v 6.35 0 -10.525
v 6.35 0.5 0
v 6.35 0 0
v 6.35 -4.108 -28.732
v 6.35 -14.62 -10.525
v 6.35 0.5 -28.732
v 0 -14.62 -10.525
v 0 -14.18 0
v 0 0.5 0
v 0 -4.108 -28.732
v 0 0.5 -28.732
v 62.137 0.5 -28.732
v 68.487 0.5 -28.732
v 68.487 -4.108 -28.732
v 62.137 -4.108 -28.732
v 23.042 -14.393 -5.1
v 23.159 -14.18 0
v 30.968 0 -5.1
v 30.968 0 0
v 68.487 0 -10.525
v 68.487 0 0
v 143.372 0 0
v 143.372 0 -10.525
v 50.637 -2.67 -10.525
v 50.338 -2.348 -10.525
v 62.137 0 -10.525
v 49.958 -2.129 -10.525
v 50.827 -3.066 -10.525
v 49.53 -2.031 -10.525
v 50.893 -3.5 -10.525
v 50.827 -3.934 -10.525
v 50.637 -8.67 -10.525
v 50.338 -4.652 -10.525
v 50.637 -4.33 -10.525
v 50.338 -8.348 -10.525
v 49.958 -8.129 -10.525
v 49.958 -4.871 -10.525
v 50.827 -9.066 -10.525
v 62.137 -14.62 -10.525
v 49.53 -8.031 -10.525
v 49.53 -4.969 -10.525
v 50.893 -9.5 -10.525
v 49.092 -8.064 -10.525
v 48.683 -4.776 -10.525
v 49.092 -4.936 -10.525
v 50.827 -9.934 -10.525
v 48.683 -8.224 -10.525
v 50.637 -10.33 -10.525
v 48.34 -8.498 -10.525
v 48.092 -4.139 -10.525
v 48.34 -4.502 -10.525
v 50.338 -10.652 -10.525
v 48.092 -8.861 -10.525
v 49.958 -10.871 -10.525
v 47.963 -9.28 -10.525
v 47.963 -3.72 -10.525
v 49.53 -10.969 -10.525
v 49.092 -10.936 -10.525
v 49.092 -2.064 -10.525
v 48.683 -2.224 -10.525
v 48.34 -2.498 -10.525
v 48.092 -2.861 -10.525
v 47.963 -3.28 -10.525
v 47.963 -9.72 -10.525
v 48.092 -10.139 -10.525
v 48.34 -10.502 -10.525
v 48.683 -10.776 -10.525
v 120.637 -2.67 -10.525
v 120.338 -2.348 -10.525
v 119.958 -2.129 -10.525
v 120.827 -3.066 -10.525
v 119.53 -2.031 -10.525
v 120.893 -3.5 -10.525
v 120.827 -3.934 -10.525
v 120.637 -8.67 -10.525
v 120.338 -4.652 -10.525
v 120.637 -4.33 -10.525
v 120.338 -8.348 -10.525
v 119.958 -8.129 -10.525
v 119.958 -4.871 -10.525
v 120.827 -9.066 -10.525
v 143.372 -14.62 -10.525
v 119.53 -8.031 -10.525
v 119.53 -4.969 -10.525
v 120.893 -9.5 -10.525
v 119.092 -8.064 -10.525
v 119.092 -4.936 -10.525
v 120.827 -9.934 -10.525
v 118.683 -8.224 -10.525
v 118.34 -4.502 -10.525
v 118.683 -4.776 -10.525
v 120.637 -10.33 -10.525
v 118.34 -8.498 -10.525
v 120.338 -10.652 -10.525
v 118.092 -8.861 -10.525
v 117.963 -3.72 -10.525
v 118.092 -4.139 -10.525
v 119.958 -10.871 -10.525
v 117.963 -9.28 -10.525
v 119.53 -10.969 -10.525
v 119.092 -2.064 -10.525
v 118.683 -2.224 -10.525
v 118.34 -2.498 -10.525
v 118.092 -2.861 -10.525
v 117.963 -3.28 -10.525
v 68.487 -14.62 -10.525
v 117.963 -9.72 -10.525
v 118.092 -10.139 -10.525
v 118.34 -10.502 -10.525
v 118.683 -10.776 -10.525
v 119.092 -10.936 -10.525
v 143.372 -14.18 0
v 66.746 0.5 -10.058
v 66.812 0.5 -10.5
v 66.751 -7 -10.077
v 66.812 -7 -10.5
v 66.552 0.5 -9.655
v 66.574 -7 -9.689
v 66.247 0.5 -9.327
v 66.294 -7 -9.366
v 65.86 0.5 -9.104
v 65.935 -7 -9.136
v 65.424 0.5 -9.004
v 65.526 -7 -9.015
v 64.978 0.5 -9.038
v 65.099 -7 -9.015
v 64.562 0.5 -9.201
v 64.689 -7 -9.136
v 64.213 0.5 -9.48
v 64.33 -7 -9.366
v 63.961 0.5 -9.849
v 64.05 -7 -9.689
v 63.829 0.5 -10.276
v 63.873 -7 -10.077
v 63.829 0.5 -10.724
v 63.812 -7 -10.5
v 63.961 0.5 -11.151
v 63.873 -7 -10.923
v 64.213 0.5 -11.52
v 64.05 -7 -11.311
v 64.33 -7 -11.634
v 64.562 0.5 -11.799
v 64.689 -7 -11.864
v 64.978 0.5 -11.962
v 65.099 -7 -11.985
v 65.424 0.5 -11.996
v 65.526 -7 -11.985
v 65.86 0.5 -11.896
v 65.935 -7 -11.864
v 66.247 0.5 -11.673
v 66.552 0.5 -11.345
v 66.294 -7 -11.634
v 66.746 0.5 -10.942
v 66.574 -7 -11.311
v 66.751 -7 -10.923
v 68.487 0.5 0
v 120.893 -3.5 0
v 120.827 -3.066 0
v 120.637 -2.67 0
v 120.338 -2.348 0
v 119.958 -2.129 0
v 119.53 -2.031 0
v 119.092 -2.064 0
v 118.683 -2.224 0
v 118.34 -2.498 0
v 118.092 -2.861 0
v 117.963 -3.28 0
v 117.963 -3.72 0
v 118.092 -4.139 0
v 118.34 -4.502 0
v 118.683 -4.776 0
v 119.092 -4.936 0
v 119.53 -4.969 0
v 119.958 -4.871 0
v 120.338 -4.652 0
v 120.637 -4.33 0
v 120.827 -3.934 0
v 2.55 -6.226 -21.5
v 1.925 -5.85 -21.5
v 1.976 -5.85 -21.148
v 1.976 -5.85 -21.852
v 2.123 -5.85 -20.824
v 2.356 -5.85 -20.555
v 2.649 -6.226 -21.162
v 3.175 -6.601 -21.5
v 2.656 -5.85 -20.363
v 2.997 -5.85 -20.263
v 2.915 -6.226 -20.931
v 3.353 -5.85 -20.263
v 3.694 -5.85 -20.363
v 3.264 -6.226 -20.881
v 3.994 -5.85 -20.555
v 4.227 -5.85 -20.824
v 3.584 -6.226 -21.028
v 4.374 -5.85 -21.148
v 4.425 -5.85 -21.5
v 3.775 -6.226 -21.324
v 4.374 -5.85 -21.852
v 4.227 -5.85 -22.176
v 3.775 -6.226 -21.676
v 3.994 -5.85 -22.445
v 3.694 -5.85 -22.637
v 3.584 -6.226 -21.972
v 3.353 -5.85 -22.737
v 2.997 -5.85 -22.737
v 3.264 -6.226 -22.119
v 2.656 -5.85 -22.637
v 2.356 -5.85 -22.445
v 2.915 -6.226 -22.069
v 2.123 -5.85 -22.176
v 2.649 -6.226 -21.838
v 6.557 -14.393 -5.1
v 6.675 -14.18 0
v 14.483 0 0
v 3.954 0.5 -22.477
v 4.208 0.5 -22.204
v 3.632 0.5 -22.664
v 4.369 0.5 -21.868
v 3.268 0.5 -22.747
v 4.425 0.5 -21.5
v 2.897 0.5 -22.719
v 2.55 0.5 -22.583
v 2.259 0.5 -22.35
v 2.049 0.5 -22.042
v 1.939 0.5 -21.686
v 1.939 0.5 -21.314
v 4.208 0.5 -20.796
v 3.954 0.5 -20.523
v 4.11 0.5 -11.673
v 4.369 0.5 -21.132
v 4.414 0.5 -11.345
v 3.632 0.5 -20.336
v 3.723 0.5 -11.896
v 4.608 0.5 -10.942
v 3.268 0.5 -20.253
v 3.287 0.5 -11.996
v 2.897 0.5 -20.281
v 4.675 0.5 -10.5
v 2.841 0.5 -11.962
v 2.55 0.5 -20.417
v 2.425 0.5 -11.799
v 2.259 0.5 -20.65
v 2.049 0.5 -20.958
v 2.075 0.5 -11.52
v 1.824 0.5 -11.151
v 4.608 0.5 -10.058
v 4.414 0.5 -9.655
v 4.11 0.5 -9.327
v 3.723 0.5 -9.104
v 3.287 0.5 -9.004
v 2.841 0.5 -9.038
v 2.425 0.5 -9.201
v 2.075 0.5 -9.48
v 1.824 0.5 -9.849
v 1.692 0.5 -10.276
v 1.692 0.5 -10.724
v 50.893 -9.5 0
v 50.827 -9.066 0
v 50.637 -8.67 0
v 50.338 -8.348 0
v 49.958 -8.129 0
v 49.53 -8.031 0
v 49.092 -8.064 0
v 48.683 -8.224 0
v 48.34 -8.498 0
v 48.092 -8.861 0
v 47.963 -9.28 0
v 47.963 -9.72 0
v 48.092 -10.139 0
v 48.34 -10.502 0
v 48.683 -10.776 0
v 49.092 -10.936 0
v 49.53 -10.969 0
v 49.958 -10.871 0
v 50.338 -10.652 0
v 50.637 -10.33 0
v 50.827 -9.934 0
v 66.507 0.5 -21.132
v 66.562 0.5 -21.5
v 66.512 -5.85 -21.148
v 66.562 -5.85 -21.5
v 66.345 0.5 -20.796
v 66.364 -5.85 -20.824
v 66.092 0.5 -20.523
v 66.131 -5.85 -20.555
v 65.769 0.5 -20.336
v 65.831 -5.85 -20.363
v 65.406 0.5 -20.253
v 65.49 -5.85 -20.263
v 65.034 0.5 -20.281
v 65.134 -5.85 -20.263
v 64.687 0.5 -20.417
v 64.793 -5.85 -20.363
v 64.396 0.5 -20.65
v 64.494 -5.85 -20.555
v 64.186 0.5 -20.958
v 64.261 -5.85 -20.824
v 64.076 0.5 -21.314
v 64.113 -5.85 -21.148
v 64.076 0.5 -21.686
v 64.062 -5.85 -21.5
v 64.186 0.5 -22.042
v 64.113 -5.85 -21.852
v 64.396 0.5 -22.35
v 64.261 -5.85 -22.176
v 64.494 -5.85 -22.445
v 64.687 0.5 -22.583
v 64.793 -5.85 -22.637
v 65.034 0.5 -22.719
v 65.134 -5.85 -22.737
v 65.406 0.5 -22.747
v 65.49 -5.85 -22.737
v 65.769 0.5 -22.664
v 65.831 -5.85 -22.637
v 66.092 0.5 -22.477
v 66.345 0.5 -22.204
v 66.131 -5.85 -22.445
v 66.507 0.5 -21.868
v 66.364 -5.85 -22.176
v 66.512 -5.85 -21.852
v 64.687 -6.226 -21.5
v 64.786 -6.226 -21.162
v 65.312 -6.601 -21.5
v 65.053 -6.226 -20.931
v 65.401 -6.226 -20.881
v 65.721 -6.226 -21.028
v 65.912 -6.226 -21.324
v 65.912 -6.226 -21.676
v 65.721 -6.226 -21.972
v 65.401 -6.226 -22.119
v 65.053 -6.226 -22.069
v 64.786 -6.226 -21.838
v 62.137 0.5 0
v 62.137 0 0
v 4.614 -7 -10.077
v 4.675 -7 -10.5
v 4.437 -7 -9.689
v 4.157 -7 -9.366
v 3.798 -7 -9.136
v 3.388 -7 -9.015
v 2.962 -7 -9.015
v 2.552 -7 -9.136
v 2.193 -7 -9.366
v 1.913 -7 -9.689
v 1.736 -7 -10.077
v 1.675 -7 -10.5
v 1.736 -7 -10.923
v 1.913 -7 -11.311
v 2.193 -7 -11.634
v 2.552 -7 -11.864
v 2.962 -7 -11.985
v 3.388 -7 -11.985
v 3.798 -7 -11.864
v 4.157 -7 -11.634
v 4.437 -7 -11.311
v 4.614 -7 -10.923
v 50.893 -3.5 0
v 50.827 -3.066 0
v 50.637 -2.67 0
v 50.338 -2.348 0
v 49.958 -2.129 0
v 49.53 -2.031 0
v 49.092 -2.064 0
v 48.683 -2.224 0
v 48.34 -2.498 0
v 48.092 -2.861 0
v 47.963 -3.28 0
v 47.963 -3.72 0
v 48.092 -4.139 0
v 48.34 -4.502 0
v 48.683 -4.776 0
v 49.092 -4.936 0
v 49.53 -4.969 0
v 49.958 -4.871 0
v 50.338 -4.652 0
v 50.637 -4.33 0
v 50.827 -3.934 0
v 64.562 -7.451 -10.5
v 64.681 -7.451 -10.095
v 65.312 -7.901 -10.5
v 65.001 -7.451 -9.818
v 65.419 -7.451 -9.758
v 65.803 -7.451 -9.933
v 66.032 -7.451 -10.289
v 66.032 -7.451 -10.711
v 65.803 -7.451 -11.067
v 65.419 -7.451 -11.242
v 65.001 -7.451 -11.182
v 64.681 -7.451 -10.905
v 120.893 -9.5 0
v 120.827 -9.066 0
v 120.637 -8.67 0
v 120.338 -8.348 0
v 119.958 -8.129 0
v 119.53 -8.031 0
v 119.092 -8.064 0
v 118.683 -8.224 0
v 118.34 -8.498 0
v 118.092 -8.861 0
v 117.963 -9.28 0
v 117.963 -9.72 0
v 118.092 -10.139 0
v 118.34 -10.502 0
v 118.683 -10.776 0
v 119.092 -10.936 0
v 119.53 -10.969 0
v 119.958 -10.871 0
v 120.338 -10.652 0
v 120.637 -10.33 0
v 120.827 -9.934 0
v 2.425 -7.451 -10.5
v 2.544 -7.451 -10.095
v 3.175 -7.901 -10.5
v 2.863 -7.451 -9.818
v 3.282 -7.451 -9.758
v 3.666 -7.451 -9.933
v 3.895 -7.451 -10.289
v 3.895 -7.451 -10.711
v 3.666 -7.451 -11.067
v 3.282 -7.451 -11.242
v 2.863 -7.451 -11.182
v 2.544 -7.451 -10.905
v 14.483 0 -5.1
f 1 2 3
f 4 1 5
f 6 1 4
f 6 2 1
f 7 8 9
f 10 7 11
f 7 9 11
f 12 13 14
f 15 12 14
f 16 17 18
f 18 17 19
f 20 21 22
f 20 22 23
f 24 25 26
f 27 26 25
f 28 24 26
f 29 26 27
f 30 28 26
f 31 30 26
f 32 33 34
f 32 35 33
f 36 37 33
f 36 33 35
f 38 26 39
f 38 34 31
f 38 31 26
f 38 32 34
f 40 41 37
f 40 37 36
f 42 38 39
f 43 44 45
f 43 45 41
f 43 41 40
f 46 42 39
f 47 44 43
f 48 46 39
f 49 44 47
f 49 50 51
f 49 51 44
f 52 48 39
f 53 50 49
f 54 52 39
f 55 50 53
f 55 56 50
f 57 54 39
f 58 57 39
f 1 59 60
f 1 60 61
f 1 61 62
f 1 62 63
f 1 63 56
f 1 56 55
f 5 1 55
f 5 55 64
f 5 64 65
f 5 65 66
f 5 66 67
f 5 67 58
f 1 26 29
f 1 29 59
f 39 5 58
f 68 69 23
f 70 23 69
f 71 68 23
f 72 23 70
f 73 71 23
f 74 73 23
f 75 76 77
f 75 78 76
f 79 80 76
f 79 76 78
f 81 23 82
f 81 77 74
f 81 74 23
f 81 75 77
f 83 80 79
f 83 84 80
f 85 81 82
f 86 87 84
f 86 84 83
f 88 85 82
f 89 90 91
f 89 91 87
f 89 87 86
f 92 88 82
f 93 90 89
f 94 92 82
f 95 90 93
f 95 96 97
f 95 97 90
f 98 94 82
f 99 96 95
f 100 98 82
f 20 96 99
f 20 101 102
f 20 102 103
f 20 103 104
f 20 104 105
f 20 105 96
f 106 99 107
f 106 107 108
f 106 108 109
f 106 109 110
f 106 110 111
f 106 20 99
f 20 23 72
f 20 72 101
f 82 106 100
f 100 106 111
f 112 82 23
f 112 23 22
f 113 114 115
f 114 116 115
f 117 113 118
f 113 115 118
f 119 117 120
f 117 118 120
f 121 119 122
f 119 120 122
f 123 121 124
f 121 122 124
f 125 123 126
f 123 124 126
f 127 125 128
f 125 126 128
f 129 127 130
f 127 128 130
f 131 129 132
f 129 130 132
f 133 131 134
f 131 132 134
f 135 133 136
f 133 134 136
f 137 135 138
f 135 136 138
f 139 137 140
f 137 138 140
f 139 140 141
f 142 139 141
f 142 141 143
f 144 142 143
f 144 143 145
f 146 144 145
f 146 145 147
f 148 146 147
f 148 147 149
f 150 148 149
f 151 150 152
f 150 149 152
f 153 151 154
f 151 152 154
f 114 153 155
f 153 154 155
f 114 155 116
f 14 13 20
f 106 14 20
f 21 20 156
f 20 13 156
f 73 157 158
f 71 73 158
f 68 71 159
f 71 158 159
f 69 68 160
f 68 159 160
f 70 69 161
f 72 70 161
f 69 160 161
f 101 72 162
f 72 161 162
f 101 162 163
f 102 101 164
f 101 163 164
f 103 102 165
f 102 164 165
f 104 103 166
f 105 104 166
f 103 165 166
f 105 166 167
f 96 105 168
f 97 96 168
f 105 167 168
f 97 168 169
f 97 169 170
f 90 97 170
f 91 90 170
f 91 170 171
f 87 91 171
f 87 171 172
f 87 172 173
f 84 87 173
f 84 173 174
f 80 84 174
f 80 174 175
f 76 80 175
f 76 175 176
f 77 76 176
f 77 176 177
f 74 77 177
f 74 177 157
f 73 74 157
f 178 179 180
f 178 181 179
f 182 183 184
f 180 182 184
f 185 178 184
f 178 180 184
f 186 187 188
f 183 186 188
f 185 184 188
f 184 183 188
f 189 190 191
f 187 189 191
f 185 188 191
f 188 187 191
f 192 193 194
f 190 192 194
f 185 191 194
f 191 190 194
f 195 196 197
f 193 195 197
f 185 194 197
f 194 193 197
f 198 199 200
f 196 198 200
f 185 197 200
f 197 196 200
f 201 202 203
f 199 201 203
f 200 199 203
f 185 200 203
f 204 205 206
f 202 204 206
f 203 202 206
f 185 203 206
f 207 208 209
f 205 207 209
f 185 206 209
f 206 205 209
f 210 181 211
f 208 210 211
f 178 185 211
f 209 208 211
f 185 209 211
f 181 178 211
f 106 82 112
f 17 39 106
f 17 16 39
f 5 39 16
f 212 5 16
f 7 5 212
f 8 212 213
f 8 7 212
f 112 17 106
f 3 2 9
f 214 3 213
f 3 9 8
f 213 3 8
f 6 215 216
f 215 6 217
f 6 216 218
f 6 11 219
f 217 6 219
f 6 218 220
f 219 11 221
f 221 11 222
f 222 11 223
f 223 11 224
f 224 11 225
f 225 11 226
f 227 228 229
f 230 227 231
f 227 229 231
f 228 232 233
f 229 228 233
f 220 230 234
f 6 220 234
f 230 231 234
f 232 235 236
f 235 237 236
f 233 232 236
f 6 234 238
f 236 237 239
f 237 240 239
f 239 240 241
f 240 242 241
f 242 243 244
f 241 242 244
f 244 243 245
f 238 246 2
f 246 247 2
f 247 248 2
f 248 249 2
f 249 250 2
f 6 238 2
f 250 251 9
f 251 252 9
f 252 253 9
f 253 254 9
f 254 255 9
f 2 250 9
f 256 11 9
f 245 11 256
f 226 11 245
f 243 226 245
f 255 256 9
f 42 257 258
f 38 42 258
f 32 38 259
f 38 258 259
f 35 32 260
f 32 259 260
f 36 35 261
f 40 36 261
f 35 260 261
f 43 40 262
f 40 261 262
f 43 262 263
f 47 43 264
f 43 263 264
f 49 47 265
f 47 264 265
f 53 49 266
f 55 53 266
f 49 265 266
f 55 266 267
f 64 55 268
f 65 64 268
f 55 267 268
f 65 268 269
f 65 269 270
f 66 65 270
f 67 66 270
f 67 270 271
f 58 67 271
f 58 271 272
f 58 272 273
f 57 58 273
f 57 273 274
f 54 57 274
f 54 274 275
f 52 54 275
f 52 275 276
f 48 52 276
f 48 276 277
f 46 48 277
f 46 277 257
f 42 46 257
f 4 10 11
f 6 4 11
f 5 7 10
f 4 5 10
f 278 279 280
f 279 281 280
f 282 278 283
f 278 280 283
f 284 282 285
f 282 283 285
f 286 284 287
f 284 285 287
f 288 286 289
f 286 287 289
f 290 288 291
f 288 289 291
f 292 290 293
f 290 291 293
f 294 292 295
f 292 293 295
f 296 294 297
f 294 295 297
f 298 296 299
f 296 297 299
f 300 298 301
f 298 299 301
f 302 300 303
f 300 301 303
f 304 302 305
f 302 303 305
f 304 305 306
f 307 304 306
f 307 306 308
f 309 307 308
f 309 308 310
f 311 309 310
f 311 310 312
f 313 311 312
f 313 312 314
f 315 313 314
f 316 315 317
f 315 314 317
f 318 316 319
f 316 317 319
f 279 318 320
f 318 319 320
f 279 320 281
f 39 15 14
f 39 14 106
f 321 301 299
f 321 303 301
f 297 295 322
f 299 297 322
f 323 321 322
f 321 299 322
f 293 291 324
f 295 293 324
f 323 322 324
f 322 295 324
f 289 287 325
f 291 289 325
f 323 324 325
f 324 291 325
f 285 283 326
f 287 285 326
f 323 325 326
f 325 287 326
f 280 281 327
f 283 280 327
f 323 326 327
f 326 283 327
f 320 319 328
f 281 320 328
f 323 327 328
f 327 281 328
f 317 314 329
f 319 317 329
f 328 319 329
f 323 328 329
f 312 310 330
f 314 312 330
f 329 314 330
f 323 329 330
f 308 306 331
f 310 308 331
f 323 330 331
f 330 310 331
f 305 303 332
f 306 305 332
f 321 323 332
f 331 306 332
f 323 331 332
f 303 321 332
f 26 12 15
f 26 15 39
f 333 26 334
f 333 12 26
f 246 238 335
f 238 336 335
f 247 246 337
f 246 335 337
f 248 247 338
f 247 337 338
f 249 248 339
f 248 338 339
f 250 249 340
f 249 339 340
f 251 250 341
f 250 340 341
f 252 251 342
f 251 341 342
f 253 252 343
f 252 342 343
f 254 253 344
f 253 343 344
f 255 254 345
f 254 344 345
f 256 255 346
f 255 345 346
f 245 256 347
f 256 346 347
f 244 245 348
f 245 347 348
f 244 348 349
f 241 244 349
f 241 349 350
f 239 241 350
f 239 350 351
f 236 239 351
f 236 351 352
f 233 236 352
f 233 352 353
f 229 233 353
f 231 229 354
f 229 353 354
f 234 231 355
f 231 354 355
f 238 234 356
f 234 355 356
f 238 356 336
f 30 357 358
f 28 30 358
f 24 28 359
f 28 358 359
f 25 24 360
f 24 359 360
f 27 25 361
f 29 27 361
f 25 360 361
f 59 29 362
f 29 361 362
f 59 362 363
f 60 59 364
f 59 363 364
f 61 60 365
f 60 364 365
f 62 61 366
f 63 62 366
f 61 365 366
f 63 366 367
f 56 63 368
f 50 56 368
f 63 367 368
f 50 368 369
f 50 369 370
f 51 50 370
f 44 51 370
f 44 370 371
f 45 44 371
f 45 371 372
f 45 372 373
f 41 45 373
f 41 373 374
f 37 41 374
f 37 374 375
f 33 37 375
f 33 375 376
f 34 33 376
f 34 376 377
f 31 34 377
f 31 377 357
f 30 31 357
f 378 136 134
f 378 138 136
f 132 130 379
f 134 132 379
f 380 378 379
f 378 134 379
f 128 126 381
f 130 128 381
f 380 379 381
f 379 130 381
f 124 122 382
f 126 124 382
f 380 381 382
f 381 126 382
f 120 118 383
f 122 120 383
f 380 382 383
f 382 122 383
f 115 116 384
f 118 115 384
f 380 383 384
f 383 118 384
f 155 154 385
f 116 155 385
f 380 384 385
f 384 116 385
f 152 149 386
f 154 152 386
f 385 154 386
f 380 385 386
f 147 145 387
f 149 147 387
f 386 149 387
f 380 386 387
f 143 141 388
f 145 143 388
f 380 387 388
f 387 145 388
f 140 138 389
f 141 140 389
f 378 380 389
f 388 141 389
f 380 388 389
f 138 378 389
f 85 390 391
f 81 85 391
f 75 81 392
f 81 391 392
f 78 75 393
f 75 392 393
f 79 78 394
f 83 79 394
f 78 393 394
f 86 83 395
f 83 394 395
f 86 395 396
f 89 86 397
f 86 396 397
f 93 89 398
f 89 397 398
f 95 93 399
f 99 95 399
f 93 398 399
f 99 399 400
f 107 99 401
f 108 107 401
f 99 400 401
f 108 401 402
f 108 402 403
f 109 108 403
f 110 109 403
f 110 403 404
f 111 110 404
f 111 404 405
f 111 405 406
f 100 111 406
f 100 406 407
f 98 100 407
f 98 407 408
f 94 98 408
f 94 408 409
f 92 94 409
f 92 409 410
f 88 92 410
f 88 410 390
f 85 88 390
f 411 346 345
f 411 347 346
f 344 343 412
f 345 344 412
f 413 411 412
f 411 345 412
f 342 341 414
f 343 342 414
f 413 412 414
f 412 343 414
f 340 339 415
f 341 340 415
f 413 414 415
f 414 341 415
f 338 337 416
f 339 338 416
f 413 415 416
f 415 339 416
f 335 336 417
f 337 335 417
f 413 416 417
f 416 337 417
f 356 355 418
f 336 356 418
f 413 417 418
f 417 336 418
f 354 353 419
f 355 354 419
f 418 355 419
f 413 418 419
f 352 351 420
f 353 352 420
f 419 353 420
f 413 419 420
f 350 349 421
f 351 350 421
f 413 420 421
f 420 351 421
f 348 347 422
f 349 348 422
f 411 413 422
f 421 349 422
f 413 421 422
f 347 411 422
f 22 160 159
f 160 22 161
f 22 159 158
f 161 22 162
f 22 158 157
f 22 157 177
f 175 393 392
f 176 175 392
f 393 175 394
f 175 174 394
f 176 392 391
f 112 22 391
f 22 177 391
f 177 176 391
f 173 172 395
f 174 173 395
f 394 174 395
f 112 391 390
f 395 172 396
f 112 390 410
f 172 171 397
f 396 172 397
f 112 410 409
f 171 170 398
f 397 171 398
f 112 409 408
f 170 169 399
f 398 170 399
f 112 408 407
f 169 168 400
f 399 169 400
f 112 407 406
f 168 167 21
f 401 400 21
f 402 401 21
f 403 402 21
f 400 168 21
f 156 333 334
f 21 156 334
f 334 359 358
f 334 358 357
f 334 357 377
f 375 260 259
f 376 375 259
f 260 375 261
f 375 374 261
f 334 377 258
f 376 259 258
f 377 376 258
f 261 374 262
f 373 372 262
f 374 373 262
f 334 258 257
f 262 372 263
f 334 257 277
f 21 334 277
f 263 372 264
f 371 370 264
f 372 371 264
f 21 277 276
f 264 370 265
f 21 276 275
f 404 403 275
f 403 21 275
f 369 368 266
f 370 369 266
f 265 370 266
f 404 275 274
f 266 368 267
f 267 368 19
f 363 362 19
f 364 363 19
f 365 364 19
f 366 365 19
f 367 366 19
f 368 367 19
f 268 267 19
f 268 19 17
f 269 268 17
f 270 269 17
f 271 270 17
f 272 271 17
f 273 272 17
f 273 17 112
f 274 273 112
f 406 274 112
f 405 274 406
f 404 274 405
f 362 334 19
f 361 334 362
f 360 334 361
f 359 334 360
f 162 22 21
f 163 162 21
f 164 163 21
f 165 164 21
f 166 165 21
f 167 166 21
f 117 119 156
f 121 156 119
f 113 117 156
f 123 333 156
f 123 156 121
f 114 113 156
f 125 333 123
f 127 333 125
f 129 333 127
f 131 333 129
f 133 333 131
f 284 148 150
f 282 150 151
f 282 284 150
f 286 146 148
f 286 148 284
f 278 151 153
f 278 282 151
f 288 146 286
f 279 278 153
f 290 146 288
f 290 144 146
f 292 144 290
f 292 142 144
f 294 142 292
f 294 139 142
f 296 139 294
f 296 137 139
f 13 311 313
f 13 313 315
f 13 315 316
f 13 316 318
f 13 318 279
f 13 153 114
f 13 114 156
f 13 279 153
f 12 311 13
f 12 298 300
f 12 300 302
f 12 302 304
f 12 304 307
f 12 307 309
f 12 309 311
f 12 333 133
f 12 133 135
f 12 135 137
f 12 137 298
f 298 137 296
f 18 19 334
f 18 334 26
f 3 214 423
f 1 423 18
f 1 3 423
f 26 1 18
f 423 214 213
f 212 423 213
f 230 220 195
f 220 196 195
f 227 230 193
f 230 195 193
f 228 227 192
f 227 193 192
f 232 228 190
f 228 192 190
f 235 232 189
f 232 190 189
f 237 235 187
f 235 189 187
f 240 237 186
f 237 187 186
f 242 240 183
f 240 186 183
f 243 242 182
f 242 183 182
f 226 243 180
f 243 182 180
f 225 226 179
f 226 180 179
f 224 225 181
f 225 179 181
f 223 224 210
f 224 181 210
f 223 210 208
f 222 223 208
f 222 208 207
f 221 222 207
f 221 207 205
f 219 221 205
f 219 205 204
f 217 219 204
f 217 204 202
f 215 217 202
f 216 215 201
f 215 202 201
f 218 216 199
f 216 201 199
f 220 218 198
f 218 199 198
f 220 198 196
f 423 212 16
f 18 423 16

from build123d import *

# Parameters (mm, degrees)
EXTRUDE2_DEPTH                 = 143.3725
BOSS_EXTRUDE4_DEPTH            = 6.35
BOSS_EXTRUDE5_DEPTH            = 6.35
M3X0_5_TAPPED_HOLE1_D          = 3
M3X0_5_TAPPED_HOLE1_DEPTH      = 7.5
M3X0_5_TAPPED_HOLE1_TIP        = 0.901290929
F_2_5_2_5_DIAMETER_HOLE1_D     = 2.5
F_2_5_2_5_DIAMETER_HOLE1_DEPTH = 6.35
F_2_5_2_5_DIAMETER_HOLE1_TIP   = 0.751075774
CUT_EXTRUDE1_DEPTH             = 5.1
F_4_CLEARANCE_HOLE1_D          = 2.9464


with BuildPart() as part:
    # Sketch73 → Extrude2 (new body)
    with BuildSketch(Plane(origin=(0, 0, 0), x_dir=(0, 0, -1), z_dir=(1, 0, 0))):
        Polygon((0, 0), (10.525, 0), (10.525, -14.62), (0, -14.18), align=None)
    extrude(amount=EXTRUDE2_DEPTH)

    # Sketch113 → Boss-Extrude4 (add)
    with BuildSketch(Plane.ZY):
        Polygon((-28.732, 0.5), (0, 0.5), (0, -14.18), (-10.525, -14.62), (-28.732, -4.108183649), align=None)
    extrude(amount=-BOSS_EXTRUDE4_DEPTH)

    # Sketch114 → Boss-Extrude5 (add)
    with BuildSketch(Plane.ZY.offset(-62.1372)):
        Polygon((-10.525, -14.62), (-10.525, 0), (0, 0), (0, 0.5), (-28.732, 0.5), (-28.732, -4.108183649), align=None)
    extrude(amount=-BOSS_EXTRUDE5_DEPTH)

    # M3x0.5 Tapped Hole1
    with Locations(Plane(origin=(-41.488675912, 0.5, -11.380370452), x_dir=(-1, 0, 0), z_dir=(0, 1, 0))):
        with Locations((-106.800875912, 0.880370452), (-44.663675912, 0.880370452)):
            Hole(M3X0_5_TAPPED_HOLE1_D / 2, depth=M3X0_5_TAPPED_HOLE1_DEPTH)
            with Locations((0, 0, -(M3X0_5_TAPPED_HOLE1_DEPTH + M3X0_5_TAPPED_HOLE1_TIP / 2))):  # 118° drill point
                Cone(0, M3X0_5_TAPPED_HOLE1_D / 2, M3X0_5_TAPPED_HOLE1_TIP, mode=Mode.SUBTRACT)

    # 2.5 _2.5_ Diameter Hole1
    with Locations(Plane(origin=(0, 0.5, 0), x_dir=(-1, 0, 0), z_dir=(0, 1, 0))):
        with Locations((-3.175, -21.5), (-65.3122, -21.5)):
            Hole(F_2_5_2_5_DIAMETER_HOLE1_D / 2, depth=F_2_5_2_5_DIAMETER_HOLE1_DEPTH)
            with Locations((0, 0, -(F_2_5_2_5_DIAMETER_HOLE1_DEPTH + F_2_5_2_5_DIAMETER_HOLE1_TIP / 2))):  # 118° drill point
                Cone(0, F_2_5_2_5_DIAMETER_HOLE1_D / 2, F_2_5_2_5_DIAMETER_HOLE1_TIP, mode=Mode.SUBTRACT)

    # Sketch117 → Cut-Extrude1 (cut)
    with BuildSketch(Plane.XY):
        Polygon((30.967580189, 0), (14.483, 0), (6.432290426, -14.62), (22.916870615, -14.62), align=None)
    extrude(amount=-CUT_EXTRUDE1_DEPTH, mode=Mode.SUBTRACT)

    # 4 Clearance Hole1 (through all)
    with Locations(Plane(origin=(0, 0, -10.525), x_dir=(-1, 0, 0), z_dir=(0, 0, -1))):
        with Locations((-119.4195, -3.5), (-119.4195, -9.5), (-49.4195, -3.5), (-49.4195, -9.5)):
            Hole(F_4_CLEARANCE_HOLE1_D / 2)


solid = part.part
